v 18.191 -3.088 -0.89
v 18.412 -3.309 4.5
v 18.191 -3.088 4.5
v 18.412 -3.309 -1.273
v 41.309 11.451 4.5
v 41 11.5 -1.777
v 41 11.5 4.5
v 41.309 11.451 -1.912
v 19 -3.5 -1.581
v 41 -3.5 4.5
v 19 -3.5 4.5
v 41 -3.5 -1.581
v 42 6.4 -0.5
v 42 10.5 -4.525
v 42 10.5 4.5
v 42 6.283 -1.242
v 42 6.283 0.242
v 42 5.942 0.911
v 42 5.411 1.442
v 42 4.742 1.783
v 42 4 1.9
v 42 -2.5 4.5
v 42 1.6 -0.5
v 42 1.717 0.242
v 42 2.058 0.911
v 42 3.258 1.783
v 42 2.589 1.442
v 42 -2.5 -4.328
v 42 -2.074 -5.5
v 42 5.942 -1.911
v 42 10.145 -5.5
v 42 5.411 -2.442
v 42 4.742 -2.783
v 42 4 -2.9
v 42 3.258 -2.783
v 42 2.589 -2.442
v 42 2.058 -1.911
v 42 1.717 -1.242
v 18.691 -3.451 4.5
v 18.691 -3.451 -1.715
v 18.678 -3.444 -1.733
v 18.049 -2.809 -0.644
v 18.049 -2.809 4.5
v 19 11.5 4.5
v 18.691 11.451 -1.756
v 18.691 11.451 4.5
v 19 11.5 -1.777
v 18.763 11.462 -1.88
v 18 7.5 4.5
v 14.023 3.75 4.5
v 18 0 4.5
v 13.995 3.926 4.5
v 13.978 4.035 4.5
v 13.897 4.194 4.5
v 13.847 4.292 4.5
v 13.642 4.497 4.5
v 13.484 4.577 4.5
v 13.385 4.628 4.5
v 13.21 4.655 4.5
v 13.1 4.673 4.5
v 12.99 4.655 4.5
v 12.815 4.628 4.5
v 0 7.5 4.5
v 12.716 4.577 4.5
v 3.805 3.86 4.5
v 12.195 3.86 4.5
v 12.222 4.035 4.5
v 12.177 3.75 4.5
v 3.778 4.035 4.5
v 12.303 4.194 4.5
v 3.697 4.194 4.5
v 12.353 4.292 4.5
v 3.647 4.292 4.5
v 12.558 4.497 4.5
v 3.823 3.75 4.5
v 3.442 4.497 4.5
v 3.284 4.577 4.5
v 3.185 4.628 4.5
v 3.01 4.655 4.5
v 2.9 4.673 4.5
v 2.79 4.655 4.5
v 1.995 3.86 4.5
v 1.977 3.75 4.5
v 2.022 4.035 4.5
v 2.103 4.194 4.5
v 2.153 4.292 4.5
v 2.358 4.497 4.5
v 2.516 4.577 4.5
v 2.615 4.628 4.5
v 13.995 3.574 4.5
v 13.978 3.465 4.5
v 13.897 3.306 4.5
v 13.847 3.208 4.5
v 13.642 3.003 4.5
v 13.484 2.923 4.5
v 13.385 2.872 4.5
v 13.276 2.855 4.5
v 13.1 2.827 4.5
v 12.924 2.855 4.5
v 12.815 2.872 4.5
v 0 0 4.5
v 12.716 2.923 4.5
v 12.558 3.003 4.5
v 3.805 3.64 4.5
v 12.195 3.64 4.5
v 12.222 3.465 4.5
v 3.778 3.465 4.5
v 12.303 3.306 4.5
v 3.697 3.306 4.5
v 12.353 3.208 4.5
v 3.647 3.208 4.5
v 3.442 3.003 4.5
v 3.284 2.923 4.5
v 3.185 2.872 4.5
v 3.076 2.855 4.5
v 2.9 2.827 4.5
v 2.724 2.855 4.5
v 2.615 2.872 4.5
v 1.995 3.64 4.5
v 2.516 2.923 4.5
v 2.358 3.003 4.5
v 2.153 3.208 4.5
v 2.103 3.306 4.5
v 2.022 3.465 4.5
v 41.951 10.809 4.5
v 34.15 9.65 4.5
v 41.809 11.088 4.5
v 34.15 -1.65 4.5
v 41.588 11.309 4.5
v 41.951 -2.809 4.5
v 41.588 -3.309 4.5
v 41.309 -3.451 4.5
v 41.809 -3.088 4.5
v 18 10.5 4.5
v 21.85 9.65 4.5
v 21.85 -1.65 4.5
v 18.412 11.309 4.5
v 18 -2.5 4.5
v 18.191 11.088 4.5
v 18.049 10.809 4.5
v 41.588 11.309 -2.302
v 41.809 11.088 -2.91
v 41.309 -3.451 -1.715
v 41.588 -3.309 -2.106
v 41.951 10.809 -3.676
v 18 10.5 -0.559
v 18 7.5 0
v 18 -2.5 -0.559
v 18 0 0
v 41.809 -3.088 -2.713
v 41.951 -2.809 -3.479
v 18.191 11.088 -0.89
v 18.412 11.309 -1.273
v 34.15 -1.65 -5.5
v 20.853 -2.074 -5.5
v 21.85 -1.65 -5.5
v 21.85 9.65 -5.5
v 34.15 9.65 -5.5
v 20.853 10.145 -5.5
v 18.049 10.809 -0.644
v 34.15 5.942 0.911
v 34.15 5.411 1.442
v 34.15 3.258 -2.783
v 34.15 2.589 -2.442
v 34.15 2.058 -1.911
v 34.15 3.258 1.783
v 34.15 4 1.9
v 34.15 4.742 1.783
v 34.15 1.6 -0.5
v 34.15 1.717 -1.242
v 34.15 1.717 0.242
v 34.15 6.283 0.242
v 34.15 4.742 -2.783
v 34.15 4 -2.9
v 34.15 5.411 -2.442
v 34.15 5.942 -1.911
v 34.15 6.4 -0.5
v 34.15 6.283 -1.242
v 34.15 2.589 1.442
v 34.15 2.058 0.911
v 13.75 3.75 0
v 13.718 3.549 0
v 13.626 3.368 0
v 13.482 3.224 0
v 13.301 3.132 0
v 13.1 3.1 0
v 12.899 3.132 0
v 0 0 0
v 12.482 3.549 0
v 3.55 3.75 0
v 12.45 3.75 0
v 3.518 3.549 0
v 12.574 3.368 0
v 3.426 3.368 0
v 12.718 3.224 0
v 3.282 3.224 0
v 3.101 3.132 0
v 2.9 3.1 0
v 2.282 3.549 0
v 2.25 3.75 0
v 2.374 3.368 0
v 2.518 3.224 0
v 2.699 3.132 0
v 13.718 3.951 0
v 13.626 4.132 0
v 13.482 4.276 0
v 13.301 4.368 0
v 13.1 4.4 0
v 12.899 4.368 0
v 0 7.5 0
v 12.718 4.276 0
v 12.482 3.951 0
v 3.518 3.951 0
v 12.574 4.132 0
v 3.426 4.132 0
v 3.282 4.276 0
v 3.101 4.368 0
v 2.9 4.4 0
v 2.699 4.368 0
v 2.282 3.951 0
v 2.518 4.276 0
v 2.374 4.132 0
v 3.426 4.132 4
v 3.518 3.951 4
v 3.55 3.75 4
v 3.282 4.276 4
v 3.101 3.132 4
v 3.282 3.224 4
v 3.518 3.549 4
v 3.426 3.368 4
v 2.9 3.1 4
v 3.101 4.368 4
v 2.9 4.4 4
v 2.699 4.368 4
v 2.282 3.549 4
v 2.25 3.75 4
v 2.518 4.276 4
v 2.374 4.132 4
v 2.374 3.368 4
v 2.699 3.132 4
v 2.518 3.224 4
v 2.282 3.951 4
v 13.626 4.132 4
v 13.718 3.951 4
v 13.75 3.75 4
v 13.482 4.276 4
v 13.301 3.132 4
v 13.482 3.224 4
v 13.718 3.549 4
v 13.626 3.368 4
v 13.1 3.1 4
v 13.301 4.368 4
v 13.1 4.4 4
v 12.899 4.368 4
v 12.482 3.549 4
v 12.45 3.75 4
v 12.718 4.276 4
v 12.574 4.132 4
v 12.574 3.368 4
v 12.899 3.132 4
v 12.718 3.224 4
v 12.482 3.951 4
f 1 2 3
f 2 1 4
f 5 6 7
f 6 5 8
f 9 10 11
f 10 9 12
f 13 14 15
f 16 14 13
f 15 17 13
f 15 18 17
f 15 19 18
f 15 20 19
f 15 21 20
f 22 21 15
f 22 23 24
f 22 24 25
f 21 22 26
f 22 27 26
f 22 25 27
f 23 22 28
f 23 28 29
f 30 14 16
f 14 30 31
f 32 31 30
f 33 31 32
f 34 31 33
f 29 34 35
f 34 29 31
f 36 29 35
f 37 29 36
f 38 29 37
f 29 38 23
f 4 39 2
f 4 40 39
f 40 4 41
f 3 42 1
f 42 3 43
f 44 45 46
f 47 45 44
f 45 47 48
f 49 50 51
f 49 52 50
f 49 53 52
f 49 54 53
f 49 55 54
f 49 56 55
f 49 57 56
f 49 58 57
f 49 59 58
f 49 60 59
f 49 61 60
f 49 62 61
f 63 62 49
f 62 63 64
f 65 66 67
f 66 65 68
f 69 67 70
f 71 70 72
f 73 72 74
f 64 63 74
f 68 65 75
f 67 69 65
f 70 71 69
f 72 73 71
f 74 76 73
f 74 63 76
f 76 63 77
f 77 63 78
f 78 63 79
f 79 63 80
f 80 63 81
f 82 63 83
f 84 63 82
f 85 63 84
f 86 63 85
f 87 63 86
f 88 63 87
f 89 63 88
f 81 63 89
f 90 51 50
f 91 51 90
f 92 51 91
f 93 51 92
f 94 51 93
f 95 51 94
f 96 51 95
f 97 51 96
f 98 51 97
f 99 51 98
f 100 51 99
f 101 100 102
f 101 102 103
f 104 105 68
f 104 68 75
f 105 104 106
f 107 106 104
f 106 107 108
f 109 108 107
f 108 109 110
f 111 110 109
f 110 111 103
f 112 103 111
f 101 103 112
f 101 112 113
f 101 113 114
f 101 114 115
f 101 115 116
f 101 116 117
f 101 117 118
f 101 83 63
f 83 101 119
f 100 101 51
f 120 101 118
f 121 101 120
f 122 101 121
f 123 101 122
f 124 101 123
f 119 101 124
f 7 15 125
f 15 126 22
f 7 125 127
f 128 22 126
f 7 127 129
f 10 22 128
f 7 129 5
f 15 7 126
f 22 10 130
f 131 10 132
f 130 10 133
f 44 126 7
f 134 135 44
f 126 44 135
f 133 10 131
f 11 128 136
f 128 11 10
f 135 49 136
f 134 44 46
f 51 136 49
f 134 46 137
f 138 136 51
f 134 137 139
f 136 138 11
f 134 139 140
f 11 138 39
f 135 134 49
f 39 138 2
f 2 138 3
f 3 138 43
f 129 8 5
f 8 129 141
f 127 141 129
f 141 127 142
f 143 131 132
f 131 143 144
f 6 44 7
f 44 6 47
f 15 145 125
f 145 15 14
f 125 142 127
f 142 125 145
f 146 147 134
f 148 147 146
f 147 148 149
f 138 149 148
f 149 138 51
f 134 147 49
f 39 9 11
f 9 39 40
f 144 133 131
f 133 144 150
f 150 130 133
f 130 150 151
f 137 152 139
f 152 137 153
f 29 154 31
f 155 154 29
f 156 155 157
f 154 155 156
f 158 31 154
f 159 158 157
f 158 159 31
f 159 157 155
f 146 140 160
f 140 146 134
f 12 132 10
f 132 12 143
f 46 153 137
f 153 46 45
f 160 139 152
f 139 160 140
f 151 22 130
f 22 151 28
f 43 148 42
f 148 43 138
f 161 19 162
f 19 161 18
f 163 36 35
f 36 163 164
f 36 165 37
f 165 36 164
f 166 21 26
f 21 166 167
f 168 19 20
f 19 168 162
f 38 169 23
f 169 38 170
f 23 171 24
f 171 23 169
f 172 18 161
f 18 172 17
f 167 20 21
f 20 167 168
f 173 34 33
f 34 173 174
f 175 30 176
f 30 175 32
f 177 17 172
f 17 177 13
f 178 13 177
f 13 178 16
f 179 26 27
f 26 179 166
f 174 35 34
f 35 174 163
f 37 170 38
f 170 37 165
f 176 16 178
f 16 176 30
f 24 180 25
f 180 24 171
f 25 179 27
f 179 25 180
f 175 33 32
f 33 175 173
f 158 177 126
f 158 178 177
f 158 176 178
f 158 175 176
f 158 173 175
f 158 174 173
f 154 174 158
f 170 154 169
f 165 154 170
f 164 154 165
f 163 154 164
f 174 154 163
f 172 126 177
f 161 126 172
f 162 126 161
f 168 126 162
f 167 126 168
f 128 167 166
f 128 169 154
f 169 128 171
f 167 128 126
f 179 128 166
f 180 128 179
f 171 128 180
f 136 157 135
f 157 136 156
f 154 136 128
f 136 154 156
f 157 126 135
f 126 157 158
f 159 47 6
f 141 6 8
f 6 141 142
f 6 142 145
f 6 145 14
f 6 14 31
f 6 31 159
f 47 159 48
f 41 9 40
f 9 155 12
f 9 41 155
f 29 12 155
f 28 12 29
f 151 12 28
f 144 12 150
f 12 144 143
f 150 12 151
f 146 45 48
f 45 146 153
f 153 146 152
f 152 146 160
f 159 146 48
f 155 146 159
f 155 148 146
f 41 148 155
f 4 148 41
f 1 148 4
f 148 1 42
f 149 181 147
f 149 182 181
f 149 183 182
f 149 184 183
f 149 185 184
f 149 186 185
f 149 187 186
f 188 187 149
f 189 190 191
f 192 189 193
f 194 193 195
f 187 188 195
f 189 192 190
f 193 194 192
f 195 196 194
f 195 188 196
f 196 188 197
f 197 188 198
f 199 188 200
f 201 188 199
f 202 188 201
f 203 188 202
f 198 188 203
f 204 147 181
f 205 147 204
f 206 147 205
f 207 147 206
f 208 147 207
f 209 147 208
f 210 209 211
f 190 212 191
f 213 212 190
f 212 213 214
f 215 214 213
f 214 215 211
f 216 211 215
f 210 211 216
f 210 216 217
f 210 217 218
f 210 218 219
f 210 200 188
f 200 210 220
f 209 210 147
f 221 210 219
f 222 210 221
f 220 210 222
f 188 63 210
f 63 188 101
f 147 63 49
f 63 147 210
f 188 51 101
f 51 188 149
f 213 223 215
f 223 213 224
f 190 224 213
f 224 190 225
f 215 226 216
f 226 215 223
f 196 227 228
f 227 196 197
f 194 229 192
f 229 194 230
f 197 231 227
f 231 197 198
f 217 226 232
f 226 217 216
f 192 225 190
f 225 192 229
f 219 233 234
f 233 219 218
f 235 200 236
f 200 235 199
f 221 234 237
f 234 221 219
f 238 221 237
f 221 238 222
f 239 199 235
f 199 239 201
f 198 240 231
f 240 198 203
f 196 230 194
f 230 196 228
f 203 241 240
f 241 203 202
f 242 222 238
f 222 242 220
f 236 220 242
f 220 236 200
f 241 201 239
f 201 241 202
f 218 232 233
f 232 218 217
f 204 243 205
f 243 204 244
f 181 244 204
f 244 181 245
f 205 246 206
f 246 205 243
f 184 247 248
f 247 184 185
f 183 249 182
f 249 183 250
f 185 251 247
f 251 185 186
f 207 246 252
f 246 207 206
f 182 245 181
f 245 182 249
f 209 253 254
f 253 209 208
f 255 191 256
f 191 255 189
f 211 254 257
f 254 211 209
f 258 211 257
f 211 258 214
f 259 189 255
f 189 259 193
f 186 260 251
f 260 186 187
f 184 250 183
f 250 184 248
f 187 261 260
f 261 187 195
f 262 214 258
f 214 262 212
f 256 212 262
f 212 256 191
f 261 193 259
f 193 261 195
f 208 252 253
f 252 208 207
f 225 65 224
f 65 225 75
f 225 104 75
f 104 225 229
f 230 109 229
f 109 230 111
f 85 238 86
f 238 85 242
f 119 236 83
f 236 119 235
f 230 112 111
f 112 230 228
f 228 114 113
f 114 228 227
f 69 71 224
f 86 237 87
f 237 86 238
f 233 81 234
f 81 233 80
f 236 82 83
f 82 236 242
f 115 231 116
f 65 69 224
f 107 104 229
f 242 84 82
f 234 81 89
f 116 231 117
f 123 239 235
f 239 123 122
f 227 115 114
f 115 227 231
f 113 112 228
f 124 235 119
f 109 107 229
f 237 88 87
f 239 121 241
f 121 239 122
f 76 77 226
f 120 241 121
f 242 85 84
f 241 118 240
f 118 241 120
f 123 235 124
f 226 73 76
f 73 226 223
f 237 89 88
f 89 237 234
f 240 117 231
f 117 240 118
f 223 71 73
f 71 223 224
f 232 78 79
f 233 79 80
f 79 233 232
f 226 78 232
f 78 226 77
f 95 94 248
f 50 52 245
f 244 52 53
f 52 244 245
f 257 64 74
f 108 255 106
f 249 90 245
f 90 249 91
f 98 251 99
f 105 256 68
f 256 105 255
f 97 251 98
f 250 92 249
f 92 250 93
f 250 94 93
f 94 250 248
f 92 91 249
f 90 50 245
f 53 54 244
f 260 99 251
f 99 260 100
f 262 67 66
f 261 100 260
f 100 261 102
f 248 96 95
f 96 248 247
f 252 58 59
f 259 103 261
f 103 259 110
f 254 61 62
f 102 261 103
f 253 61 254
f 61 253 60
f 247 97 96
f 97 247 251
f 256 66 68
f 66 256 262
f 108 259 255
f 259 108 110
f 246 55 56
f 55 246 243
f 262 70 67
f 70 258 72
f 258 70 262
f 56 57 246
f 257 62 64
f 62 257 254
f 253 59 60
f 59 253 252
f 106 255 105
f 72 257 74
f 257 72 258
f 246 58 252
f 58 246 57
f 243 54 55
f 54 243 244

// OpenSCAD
/*
part used to hold the neuropixels probe

*/

$fs=0.1;
$fn=20;
// hexagone shape for nuts 
function cot(x)=1/tan(x);
module hexagone (height=0.95,width=3){
    angle = 360/6;		// 6 pans
	cote = width * cot(angle);
	translate([0,0,height/2])
    union()
	{
		rotate([0,0,0])
			cube([width,cote,height],center=true);
		rotate([0,0,angle])
			cube([width,cote,height],center=true);
		rotate([0,0,2*angle])
			cube([width,cote,height],center=true);
	}
}

module stereotaxic_c_clamp_simple (){
base_length=24; // length in the middle of the drive
base_width=15; // width in the middle of the drive
base_height=10; //
base_shift=2;
post_length=11.3;
post_width=10.3;
rounding_radius=1.0; // radius of circles that rounds the corners 
fs=0.1;

screw_diameter=4.8;
screw_length=25;

 difference(){
    union(){
     hull(){    
            // place 4 circles in the corners, with the given radius
      translate([(base_length/2)-(rounding_radius)+base_shift, (-base_width/2)+(rounding_radius),0])
      cylinder(r=rounding_radius,h=base_height,$fs=fs);
      translate([(-base_length/2)+(rounding_radius)+base_shift, (-base_width/2)+(rounding_radius),0])
      cylinder(r=rounding_radius,h=base_height,$fs=fs);
      translate([(-base_length/2)+(rounding_radius)+base_shift, (base_width/2)-(rounding_radius),0])
      cylinder(r=rounding_radius,h=base_height,$fs=fs);
      translate([(base_length/2)-(rounding_radius)+base_shift, (base_width/2)-(rounding_radius),0])
      cylinder(r=rounding_radius,h=base_height,$fs=fs);
        }     
    
    }  
    translate([0,0,base_height/2]) rotate([0,90,0]) cylinder(h=screw_length,r=screw_diameter/2,$fs=fs);
    translate([-(post_length+1)/2,-(post_width+1)/2,-0.5]) cube([post_length+1,post_width+1,base_height+1]);
    
    translate([-base_length/2+base_shift-0.5,-base_width-3,base_height*2/3]) rotate([-20,0,0])  cube([base_length+1,10,base_height]);
    translate([-base_length/2+base_shift-0.5,base_width/2+1,base_height*1/3]) rotate([20,0,0])  cube([base_length+1,10,base_height]);
    translate([-base_length/2+base_shift-6,-base_width/2-1,base_height*2/3]) rotate([0,30,0])  cube([5+1,base_width+2,base_height]);
}
}

module stereotaxic_holder_microdrive(height=4.5, width = 7.5, length = 20, holderScrewXSpacing=10.2){
    difference(){
        union(){
    cube([length,width,height]);
    translate([28,4,4.5])rotate([180,0,0])stereotaxic_c_clamp_simple();
        }
    //holes for the microdrive screws
    translate([length/2-holderScrewXSpacing/2-2,width/2,-0.1])cylinder(d=1.3,h=4.7);
    translate([length/2+holderScrewXSpacing/2-2,width/2,-0.1])cylinder(d=1.3,h=4.7);
    
    // make sure the screw holes are not blocked
    translate([length/2-holderScrewXSpacing/2-2,width/2,height-0.5])cylinder(d1=1.3,d2=2.5,h=1.1);
    translate([length/2+holderScrewXSpacing/2-2,width/2,height-0.5])cylinder(d1=1.3,d2=2.5,h=1.1);
        
    }
}

stereotaxic_holder_microdrive();
